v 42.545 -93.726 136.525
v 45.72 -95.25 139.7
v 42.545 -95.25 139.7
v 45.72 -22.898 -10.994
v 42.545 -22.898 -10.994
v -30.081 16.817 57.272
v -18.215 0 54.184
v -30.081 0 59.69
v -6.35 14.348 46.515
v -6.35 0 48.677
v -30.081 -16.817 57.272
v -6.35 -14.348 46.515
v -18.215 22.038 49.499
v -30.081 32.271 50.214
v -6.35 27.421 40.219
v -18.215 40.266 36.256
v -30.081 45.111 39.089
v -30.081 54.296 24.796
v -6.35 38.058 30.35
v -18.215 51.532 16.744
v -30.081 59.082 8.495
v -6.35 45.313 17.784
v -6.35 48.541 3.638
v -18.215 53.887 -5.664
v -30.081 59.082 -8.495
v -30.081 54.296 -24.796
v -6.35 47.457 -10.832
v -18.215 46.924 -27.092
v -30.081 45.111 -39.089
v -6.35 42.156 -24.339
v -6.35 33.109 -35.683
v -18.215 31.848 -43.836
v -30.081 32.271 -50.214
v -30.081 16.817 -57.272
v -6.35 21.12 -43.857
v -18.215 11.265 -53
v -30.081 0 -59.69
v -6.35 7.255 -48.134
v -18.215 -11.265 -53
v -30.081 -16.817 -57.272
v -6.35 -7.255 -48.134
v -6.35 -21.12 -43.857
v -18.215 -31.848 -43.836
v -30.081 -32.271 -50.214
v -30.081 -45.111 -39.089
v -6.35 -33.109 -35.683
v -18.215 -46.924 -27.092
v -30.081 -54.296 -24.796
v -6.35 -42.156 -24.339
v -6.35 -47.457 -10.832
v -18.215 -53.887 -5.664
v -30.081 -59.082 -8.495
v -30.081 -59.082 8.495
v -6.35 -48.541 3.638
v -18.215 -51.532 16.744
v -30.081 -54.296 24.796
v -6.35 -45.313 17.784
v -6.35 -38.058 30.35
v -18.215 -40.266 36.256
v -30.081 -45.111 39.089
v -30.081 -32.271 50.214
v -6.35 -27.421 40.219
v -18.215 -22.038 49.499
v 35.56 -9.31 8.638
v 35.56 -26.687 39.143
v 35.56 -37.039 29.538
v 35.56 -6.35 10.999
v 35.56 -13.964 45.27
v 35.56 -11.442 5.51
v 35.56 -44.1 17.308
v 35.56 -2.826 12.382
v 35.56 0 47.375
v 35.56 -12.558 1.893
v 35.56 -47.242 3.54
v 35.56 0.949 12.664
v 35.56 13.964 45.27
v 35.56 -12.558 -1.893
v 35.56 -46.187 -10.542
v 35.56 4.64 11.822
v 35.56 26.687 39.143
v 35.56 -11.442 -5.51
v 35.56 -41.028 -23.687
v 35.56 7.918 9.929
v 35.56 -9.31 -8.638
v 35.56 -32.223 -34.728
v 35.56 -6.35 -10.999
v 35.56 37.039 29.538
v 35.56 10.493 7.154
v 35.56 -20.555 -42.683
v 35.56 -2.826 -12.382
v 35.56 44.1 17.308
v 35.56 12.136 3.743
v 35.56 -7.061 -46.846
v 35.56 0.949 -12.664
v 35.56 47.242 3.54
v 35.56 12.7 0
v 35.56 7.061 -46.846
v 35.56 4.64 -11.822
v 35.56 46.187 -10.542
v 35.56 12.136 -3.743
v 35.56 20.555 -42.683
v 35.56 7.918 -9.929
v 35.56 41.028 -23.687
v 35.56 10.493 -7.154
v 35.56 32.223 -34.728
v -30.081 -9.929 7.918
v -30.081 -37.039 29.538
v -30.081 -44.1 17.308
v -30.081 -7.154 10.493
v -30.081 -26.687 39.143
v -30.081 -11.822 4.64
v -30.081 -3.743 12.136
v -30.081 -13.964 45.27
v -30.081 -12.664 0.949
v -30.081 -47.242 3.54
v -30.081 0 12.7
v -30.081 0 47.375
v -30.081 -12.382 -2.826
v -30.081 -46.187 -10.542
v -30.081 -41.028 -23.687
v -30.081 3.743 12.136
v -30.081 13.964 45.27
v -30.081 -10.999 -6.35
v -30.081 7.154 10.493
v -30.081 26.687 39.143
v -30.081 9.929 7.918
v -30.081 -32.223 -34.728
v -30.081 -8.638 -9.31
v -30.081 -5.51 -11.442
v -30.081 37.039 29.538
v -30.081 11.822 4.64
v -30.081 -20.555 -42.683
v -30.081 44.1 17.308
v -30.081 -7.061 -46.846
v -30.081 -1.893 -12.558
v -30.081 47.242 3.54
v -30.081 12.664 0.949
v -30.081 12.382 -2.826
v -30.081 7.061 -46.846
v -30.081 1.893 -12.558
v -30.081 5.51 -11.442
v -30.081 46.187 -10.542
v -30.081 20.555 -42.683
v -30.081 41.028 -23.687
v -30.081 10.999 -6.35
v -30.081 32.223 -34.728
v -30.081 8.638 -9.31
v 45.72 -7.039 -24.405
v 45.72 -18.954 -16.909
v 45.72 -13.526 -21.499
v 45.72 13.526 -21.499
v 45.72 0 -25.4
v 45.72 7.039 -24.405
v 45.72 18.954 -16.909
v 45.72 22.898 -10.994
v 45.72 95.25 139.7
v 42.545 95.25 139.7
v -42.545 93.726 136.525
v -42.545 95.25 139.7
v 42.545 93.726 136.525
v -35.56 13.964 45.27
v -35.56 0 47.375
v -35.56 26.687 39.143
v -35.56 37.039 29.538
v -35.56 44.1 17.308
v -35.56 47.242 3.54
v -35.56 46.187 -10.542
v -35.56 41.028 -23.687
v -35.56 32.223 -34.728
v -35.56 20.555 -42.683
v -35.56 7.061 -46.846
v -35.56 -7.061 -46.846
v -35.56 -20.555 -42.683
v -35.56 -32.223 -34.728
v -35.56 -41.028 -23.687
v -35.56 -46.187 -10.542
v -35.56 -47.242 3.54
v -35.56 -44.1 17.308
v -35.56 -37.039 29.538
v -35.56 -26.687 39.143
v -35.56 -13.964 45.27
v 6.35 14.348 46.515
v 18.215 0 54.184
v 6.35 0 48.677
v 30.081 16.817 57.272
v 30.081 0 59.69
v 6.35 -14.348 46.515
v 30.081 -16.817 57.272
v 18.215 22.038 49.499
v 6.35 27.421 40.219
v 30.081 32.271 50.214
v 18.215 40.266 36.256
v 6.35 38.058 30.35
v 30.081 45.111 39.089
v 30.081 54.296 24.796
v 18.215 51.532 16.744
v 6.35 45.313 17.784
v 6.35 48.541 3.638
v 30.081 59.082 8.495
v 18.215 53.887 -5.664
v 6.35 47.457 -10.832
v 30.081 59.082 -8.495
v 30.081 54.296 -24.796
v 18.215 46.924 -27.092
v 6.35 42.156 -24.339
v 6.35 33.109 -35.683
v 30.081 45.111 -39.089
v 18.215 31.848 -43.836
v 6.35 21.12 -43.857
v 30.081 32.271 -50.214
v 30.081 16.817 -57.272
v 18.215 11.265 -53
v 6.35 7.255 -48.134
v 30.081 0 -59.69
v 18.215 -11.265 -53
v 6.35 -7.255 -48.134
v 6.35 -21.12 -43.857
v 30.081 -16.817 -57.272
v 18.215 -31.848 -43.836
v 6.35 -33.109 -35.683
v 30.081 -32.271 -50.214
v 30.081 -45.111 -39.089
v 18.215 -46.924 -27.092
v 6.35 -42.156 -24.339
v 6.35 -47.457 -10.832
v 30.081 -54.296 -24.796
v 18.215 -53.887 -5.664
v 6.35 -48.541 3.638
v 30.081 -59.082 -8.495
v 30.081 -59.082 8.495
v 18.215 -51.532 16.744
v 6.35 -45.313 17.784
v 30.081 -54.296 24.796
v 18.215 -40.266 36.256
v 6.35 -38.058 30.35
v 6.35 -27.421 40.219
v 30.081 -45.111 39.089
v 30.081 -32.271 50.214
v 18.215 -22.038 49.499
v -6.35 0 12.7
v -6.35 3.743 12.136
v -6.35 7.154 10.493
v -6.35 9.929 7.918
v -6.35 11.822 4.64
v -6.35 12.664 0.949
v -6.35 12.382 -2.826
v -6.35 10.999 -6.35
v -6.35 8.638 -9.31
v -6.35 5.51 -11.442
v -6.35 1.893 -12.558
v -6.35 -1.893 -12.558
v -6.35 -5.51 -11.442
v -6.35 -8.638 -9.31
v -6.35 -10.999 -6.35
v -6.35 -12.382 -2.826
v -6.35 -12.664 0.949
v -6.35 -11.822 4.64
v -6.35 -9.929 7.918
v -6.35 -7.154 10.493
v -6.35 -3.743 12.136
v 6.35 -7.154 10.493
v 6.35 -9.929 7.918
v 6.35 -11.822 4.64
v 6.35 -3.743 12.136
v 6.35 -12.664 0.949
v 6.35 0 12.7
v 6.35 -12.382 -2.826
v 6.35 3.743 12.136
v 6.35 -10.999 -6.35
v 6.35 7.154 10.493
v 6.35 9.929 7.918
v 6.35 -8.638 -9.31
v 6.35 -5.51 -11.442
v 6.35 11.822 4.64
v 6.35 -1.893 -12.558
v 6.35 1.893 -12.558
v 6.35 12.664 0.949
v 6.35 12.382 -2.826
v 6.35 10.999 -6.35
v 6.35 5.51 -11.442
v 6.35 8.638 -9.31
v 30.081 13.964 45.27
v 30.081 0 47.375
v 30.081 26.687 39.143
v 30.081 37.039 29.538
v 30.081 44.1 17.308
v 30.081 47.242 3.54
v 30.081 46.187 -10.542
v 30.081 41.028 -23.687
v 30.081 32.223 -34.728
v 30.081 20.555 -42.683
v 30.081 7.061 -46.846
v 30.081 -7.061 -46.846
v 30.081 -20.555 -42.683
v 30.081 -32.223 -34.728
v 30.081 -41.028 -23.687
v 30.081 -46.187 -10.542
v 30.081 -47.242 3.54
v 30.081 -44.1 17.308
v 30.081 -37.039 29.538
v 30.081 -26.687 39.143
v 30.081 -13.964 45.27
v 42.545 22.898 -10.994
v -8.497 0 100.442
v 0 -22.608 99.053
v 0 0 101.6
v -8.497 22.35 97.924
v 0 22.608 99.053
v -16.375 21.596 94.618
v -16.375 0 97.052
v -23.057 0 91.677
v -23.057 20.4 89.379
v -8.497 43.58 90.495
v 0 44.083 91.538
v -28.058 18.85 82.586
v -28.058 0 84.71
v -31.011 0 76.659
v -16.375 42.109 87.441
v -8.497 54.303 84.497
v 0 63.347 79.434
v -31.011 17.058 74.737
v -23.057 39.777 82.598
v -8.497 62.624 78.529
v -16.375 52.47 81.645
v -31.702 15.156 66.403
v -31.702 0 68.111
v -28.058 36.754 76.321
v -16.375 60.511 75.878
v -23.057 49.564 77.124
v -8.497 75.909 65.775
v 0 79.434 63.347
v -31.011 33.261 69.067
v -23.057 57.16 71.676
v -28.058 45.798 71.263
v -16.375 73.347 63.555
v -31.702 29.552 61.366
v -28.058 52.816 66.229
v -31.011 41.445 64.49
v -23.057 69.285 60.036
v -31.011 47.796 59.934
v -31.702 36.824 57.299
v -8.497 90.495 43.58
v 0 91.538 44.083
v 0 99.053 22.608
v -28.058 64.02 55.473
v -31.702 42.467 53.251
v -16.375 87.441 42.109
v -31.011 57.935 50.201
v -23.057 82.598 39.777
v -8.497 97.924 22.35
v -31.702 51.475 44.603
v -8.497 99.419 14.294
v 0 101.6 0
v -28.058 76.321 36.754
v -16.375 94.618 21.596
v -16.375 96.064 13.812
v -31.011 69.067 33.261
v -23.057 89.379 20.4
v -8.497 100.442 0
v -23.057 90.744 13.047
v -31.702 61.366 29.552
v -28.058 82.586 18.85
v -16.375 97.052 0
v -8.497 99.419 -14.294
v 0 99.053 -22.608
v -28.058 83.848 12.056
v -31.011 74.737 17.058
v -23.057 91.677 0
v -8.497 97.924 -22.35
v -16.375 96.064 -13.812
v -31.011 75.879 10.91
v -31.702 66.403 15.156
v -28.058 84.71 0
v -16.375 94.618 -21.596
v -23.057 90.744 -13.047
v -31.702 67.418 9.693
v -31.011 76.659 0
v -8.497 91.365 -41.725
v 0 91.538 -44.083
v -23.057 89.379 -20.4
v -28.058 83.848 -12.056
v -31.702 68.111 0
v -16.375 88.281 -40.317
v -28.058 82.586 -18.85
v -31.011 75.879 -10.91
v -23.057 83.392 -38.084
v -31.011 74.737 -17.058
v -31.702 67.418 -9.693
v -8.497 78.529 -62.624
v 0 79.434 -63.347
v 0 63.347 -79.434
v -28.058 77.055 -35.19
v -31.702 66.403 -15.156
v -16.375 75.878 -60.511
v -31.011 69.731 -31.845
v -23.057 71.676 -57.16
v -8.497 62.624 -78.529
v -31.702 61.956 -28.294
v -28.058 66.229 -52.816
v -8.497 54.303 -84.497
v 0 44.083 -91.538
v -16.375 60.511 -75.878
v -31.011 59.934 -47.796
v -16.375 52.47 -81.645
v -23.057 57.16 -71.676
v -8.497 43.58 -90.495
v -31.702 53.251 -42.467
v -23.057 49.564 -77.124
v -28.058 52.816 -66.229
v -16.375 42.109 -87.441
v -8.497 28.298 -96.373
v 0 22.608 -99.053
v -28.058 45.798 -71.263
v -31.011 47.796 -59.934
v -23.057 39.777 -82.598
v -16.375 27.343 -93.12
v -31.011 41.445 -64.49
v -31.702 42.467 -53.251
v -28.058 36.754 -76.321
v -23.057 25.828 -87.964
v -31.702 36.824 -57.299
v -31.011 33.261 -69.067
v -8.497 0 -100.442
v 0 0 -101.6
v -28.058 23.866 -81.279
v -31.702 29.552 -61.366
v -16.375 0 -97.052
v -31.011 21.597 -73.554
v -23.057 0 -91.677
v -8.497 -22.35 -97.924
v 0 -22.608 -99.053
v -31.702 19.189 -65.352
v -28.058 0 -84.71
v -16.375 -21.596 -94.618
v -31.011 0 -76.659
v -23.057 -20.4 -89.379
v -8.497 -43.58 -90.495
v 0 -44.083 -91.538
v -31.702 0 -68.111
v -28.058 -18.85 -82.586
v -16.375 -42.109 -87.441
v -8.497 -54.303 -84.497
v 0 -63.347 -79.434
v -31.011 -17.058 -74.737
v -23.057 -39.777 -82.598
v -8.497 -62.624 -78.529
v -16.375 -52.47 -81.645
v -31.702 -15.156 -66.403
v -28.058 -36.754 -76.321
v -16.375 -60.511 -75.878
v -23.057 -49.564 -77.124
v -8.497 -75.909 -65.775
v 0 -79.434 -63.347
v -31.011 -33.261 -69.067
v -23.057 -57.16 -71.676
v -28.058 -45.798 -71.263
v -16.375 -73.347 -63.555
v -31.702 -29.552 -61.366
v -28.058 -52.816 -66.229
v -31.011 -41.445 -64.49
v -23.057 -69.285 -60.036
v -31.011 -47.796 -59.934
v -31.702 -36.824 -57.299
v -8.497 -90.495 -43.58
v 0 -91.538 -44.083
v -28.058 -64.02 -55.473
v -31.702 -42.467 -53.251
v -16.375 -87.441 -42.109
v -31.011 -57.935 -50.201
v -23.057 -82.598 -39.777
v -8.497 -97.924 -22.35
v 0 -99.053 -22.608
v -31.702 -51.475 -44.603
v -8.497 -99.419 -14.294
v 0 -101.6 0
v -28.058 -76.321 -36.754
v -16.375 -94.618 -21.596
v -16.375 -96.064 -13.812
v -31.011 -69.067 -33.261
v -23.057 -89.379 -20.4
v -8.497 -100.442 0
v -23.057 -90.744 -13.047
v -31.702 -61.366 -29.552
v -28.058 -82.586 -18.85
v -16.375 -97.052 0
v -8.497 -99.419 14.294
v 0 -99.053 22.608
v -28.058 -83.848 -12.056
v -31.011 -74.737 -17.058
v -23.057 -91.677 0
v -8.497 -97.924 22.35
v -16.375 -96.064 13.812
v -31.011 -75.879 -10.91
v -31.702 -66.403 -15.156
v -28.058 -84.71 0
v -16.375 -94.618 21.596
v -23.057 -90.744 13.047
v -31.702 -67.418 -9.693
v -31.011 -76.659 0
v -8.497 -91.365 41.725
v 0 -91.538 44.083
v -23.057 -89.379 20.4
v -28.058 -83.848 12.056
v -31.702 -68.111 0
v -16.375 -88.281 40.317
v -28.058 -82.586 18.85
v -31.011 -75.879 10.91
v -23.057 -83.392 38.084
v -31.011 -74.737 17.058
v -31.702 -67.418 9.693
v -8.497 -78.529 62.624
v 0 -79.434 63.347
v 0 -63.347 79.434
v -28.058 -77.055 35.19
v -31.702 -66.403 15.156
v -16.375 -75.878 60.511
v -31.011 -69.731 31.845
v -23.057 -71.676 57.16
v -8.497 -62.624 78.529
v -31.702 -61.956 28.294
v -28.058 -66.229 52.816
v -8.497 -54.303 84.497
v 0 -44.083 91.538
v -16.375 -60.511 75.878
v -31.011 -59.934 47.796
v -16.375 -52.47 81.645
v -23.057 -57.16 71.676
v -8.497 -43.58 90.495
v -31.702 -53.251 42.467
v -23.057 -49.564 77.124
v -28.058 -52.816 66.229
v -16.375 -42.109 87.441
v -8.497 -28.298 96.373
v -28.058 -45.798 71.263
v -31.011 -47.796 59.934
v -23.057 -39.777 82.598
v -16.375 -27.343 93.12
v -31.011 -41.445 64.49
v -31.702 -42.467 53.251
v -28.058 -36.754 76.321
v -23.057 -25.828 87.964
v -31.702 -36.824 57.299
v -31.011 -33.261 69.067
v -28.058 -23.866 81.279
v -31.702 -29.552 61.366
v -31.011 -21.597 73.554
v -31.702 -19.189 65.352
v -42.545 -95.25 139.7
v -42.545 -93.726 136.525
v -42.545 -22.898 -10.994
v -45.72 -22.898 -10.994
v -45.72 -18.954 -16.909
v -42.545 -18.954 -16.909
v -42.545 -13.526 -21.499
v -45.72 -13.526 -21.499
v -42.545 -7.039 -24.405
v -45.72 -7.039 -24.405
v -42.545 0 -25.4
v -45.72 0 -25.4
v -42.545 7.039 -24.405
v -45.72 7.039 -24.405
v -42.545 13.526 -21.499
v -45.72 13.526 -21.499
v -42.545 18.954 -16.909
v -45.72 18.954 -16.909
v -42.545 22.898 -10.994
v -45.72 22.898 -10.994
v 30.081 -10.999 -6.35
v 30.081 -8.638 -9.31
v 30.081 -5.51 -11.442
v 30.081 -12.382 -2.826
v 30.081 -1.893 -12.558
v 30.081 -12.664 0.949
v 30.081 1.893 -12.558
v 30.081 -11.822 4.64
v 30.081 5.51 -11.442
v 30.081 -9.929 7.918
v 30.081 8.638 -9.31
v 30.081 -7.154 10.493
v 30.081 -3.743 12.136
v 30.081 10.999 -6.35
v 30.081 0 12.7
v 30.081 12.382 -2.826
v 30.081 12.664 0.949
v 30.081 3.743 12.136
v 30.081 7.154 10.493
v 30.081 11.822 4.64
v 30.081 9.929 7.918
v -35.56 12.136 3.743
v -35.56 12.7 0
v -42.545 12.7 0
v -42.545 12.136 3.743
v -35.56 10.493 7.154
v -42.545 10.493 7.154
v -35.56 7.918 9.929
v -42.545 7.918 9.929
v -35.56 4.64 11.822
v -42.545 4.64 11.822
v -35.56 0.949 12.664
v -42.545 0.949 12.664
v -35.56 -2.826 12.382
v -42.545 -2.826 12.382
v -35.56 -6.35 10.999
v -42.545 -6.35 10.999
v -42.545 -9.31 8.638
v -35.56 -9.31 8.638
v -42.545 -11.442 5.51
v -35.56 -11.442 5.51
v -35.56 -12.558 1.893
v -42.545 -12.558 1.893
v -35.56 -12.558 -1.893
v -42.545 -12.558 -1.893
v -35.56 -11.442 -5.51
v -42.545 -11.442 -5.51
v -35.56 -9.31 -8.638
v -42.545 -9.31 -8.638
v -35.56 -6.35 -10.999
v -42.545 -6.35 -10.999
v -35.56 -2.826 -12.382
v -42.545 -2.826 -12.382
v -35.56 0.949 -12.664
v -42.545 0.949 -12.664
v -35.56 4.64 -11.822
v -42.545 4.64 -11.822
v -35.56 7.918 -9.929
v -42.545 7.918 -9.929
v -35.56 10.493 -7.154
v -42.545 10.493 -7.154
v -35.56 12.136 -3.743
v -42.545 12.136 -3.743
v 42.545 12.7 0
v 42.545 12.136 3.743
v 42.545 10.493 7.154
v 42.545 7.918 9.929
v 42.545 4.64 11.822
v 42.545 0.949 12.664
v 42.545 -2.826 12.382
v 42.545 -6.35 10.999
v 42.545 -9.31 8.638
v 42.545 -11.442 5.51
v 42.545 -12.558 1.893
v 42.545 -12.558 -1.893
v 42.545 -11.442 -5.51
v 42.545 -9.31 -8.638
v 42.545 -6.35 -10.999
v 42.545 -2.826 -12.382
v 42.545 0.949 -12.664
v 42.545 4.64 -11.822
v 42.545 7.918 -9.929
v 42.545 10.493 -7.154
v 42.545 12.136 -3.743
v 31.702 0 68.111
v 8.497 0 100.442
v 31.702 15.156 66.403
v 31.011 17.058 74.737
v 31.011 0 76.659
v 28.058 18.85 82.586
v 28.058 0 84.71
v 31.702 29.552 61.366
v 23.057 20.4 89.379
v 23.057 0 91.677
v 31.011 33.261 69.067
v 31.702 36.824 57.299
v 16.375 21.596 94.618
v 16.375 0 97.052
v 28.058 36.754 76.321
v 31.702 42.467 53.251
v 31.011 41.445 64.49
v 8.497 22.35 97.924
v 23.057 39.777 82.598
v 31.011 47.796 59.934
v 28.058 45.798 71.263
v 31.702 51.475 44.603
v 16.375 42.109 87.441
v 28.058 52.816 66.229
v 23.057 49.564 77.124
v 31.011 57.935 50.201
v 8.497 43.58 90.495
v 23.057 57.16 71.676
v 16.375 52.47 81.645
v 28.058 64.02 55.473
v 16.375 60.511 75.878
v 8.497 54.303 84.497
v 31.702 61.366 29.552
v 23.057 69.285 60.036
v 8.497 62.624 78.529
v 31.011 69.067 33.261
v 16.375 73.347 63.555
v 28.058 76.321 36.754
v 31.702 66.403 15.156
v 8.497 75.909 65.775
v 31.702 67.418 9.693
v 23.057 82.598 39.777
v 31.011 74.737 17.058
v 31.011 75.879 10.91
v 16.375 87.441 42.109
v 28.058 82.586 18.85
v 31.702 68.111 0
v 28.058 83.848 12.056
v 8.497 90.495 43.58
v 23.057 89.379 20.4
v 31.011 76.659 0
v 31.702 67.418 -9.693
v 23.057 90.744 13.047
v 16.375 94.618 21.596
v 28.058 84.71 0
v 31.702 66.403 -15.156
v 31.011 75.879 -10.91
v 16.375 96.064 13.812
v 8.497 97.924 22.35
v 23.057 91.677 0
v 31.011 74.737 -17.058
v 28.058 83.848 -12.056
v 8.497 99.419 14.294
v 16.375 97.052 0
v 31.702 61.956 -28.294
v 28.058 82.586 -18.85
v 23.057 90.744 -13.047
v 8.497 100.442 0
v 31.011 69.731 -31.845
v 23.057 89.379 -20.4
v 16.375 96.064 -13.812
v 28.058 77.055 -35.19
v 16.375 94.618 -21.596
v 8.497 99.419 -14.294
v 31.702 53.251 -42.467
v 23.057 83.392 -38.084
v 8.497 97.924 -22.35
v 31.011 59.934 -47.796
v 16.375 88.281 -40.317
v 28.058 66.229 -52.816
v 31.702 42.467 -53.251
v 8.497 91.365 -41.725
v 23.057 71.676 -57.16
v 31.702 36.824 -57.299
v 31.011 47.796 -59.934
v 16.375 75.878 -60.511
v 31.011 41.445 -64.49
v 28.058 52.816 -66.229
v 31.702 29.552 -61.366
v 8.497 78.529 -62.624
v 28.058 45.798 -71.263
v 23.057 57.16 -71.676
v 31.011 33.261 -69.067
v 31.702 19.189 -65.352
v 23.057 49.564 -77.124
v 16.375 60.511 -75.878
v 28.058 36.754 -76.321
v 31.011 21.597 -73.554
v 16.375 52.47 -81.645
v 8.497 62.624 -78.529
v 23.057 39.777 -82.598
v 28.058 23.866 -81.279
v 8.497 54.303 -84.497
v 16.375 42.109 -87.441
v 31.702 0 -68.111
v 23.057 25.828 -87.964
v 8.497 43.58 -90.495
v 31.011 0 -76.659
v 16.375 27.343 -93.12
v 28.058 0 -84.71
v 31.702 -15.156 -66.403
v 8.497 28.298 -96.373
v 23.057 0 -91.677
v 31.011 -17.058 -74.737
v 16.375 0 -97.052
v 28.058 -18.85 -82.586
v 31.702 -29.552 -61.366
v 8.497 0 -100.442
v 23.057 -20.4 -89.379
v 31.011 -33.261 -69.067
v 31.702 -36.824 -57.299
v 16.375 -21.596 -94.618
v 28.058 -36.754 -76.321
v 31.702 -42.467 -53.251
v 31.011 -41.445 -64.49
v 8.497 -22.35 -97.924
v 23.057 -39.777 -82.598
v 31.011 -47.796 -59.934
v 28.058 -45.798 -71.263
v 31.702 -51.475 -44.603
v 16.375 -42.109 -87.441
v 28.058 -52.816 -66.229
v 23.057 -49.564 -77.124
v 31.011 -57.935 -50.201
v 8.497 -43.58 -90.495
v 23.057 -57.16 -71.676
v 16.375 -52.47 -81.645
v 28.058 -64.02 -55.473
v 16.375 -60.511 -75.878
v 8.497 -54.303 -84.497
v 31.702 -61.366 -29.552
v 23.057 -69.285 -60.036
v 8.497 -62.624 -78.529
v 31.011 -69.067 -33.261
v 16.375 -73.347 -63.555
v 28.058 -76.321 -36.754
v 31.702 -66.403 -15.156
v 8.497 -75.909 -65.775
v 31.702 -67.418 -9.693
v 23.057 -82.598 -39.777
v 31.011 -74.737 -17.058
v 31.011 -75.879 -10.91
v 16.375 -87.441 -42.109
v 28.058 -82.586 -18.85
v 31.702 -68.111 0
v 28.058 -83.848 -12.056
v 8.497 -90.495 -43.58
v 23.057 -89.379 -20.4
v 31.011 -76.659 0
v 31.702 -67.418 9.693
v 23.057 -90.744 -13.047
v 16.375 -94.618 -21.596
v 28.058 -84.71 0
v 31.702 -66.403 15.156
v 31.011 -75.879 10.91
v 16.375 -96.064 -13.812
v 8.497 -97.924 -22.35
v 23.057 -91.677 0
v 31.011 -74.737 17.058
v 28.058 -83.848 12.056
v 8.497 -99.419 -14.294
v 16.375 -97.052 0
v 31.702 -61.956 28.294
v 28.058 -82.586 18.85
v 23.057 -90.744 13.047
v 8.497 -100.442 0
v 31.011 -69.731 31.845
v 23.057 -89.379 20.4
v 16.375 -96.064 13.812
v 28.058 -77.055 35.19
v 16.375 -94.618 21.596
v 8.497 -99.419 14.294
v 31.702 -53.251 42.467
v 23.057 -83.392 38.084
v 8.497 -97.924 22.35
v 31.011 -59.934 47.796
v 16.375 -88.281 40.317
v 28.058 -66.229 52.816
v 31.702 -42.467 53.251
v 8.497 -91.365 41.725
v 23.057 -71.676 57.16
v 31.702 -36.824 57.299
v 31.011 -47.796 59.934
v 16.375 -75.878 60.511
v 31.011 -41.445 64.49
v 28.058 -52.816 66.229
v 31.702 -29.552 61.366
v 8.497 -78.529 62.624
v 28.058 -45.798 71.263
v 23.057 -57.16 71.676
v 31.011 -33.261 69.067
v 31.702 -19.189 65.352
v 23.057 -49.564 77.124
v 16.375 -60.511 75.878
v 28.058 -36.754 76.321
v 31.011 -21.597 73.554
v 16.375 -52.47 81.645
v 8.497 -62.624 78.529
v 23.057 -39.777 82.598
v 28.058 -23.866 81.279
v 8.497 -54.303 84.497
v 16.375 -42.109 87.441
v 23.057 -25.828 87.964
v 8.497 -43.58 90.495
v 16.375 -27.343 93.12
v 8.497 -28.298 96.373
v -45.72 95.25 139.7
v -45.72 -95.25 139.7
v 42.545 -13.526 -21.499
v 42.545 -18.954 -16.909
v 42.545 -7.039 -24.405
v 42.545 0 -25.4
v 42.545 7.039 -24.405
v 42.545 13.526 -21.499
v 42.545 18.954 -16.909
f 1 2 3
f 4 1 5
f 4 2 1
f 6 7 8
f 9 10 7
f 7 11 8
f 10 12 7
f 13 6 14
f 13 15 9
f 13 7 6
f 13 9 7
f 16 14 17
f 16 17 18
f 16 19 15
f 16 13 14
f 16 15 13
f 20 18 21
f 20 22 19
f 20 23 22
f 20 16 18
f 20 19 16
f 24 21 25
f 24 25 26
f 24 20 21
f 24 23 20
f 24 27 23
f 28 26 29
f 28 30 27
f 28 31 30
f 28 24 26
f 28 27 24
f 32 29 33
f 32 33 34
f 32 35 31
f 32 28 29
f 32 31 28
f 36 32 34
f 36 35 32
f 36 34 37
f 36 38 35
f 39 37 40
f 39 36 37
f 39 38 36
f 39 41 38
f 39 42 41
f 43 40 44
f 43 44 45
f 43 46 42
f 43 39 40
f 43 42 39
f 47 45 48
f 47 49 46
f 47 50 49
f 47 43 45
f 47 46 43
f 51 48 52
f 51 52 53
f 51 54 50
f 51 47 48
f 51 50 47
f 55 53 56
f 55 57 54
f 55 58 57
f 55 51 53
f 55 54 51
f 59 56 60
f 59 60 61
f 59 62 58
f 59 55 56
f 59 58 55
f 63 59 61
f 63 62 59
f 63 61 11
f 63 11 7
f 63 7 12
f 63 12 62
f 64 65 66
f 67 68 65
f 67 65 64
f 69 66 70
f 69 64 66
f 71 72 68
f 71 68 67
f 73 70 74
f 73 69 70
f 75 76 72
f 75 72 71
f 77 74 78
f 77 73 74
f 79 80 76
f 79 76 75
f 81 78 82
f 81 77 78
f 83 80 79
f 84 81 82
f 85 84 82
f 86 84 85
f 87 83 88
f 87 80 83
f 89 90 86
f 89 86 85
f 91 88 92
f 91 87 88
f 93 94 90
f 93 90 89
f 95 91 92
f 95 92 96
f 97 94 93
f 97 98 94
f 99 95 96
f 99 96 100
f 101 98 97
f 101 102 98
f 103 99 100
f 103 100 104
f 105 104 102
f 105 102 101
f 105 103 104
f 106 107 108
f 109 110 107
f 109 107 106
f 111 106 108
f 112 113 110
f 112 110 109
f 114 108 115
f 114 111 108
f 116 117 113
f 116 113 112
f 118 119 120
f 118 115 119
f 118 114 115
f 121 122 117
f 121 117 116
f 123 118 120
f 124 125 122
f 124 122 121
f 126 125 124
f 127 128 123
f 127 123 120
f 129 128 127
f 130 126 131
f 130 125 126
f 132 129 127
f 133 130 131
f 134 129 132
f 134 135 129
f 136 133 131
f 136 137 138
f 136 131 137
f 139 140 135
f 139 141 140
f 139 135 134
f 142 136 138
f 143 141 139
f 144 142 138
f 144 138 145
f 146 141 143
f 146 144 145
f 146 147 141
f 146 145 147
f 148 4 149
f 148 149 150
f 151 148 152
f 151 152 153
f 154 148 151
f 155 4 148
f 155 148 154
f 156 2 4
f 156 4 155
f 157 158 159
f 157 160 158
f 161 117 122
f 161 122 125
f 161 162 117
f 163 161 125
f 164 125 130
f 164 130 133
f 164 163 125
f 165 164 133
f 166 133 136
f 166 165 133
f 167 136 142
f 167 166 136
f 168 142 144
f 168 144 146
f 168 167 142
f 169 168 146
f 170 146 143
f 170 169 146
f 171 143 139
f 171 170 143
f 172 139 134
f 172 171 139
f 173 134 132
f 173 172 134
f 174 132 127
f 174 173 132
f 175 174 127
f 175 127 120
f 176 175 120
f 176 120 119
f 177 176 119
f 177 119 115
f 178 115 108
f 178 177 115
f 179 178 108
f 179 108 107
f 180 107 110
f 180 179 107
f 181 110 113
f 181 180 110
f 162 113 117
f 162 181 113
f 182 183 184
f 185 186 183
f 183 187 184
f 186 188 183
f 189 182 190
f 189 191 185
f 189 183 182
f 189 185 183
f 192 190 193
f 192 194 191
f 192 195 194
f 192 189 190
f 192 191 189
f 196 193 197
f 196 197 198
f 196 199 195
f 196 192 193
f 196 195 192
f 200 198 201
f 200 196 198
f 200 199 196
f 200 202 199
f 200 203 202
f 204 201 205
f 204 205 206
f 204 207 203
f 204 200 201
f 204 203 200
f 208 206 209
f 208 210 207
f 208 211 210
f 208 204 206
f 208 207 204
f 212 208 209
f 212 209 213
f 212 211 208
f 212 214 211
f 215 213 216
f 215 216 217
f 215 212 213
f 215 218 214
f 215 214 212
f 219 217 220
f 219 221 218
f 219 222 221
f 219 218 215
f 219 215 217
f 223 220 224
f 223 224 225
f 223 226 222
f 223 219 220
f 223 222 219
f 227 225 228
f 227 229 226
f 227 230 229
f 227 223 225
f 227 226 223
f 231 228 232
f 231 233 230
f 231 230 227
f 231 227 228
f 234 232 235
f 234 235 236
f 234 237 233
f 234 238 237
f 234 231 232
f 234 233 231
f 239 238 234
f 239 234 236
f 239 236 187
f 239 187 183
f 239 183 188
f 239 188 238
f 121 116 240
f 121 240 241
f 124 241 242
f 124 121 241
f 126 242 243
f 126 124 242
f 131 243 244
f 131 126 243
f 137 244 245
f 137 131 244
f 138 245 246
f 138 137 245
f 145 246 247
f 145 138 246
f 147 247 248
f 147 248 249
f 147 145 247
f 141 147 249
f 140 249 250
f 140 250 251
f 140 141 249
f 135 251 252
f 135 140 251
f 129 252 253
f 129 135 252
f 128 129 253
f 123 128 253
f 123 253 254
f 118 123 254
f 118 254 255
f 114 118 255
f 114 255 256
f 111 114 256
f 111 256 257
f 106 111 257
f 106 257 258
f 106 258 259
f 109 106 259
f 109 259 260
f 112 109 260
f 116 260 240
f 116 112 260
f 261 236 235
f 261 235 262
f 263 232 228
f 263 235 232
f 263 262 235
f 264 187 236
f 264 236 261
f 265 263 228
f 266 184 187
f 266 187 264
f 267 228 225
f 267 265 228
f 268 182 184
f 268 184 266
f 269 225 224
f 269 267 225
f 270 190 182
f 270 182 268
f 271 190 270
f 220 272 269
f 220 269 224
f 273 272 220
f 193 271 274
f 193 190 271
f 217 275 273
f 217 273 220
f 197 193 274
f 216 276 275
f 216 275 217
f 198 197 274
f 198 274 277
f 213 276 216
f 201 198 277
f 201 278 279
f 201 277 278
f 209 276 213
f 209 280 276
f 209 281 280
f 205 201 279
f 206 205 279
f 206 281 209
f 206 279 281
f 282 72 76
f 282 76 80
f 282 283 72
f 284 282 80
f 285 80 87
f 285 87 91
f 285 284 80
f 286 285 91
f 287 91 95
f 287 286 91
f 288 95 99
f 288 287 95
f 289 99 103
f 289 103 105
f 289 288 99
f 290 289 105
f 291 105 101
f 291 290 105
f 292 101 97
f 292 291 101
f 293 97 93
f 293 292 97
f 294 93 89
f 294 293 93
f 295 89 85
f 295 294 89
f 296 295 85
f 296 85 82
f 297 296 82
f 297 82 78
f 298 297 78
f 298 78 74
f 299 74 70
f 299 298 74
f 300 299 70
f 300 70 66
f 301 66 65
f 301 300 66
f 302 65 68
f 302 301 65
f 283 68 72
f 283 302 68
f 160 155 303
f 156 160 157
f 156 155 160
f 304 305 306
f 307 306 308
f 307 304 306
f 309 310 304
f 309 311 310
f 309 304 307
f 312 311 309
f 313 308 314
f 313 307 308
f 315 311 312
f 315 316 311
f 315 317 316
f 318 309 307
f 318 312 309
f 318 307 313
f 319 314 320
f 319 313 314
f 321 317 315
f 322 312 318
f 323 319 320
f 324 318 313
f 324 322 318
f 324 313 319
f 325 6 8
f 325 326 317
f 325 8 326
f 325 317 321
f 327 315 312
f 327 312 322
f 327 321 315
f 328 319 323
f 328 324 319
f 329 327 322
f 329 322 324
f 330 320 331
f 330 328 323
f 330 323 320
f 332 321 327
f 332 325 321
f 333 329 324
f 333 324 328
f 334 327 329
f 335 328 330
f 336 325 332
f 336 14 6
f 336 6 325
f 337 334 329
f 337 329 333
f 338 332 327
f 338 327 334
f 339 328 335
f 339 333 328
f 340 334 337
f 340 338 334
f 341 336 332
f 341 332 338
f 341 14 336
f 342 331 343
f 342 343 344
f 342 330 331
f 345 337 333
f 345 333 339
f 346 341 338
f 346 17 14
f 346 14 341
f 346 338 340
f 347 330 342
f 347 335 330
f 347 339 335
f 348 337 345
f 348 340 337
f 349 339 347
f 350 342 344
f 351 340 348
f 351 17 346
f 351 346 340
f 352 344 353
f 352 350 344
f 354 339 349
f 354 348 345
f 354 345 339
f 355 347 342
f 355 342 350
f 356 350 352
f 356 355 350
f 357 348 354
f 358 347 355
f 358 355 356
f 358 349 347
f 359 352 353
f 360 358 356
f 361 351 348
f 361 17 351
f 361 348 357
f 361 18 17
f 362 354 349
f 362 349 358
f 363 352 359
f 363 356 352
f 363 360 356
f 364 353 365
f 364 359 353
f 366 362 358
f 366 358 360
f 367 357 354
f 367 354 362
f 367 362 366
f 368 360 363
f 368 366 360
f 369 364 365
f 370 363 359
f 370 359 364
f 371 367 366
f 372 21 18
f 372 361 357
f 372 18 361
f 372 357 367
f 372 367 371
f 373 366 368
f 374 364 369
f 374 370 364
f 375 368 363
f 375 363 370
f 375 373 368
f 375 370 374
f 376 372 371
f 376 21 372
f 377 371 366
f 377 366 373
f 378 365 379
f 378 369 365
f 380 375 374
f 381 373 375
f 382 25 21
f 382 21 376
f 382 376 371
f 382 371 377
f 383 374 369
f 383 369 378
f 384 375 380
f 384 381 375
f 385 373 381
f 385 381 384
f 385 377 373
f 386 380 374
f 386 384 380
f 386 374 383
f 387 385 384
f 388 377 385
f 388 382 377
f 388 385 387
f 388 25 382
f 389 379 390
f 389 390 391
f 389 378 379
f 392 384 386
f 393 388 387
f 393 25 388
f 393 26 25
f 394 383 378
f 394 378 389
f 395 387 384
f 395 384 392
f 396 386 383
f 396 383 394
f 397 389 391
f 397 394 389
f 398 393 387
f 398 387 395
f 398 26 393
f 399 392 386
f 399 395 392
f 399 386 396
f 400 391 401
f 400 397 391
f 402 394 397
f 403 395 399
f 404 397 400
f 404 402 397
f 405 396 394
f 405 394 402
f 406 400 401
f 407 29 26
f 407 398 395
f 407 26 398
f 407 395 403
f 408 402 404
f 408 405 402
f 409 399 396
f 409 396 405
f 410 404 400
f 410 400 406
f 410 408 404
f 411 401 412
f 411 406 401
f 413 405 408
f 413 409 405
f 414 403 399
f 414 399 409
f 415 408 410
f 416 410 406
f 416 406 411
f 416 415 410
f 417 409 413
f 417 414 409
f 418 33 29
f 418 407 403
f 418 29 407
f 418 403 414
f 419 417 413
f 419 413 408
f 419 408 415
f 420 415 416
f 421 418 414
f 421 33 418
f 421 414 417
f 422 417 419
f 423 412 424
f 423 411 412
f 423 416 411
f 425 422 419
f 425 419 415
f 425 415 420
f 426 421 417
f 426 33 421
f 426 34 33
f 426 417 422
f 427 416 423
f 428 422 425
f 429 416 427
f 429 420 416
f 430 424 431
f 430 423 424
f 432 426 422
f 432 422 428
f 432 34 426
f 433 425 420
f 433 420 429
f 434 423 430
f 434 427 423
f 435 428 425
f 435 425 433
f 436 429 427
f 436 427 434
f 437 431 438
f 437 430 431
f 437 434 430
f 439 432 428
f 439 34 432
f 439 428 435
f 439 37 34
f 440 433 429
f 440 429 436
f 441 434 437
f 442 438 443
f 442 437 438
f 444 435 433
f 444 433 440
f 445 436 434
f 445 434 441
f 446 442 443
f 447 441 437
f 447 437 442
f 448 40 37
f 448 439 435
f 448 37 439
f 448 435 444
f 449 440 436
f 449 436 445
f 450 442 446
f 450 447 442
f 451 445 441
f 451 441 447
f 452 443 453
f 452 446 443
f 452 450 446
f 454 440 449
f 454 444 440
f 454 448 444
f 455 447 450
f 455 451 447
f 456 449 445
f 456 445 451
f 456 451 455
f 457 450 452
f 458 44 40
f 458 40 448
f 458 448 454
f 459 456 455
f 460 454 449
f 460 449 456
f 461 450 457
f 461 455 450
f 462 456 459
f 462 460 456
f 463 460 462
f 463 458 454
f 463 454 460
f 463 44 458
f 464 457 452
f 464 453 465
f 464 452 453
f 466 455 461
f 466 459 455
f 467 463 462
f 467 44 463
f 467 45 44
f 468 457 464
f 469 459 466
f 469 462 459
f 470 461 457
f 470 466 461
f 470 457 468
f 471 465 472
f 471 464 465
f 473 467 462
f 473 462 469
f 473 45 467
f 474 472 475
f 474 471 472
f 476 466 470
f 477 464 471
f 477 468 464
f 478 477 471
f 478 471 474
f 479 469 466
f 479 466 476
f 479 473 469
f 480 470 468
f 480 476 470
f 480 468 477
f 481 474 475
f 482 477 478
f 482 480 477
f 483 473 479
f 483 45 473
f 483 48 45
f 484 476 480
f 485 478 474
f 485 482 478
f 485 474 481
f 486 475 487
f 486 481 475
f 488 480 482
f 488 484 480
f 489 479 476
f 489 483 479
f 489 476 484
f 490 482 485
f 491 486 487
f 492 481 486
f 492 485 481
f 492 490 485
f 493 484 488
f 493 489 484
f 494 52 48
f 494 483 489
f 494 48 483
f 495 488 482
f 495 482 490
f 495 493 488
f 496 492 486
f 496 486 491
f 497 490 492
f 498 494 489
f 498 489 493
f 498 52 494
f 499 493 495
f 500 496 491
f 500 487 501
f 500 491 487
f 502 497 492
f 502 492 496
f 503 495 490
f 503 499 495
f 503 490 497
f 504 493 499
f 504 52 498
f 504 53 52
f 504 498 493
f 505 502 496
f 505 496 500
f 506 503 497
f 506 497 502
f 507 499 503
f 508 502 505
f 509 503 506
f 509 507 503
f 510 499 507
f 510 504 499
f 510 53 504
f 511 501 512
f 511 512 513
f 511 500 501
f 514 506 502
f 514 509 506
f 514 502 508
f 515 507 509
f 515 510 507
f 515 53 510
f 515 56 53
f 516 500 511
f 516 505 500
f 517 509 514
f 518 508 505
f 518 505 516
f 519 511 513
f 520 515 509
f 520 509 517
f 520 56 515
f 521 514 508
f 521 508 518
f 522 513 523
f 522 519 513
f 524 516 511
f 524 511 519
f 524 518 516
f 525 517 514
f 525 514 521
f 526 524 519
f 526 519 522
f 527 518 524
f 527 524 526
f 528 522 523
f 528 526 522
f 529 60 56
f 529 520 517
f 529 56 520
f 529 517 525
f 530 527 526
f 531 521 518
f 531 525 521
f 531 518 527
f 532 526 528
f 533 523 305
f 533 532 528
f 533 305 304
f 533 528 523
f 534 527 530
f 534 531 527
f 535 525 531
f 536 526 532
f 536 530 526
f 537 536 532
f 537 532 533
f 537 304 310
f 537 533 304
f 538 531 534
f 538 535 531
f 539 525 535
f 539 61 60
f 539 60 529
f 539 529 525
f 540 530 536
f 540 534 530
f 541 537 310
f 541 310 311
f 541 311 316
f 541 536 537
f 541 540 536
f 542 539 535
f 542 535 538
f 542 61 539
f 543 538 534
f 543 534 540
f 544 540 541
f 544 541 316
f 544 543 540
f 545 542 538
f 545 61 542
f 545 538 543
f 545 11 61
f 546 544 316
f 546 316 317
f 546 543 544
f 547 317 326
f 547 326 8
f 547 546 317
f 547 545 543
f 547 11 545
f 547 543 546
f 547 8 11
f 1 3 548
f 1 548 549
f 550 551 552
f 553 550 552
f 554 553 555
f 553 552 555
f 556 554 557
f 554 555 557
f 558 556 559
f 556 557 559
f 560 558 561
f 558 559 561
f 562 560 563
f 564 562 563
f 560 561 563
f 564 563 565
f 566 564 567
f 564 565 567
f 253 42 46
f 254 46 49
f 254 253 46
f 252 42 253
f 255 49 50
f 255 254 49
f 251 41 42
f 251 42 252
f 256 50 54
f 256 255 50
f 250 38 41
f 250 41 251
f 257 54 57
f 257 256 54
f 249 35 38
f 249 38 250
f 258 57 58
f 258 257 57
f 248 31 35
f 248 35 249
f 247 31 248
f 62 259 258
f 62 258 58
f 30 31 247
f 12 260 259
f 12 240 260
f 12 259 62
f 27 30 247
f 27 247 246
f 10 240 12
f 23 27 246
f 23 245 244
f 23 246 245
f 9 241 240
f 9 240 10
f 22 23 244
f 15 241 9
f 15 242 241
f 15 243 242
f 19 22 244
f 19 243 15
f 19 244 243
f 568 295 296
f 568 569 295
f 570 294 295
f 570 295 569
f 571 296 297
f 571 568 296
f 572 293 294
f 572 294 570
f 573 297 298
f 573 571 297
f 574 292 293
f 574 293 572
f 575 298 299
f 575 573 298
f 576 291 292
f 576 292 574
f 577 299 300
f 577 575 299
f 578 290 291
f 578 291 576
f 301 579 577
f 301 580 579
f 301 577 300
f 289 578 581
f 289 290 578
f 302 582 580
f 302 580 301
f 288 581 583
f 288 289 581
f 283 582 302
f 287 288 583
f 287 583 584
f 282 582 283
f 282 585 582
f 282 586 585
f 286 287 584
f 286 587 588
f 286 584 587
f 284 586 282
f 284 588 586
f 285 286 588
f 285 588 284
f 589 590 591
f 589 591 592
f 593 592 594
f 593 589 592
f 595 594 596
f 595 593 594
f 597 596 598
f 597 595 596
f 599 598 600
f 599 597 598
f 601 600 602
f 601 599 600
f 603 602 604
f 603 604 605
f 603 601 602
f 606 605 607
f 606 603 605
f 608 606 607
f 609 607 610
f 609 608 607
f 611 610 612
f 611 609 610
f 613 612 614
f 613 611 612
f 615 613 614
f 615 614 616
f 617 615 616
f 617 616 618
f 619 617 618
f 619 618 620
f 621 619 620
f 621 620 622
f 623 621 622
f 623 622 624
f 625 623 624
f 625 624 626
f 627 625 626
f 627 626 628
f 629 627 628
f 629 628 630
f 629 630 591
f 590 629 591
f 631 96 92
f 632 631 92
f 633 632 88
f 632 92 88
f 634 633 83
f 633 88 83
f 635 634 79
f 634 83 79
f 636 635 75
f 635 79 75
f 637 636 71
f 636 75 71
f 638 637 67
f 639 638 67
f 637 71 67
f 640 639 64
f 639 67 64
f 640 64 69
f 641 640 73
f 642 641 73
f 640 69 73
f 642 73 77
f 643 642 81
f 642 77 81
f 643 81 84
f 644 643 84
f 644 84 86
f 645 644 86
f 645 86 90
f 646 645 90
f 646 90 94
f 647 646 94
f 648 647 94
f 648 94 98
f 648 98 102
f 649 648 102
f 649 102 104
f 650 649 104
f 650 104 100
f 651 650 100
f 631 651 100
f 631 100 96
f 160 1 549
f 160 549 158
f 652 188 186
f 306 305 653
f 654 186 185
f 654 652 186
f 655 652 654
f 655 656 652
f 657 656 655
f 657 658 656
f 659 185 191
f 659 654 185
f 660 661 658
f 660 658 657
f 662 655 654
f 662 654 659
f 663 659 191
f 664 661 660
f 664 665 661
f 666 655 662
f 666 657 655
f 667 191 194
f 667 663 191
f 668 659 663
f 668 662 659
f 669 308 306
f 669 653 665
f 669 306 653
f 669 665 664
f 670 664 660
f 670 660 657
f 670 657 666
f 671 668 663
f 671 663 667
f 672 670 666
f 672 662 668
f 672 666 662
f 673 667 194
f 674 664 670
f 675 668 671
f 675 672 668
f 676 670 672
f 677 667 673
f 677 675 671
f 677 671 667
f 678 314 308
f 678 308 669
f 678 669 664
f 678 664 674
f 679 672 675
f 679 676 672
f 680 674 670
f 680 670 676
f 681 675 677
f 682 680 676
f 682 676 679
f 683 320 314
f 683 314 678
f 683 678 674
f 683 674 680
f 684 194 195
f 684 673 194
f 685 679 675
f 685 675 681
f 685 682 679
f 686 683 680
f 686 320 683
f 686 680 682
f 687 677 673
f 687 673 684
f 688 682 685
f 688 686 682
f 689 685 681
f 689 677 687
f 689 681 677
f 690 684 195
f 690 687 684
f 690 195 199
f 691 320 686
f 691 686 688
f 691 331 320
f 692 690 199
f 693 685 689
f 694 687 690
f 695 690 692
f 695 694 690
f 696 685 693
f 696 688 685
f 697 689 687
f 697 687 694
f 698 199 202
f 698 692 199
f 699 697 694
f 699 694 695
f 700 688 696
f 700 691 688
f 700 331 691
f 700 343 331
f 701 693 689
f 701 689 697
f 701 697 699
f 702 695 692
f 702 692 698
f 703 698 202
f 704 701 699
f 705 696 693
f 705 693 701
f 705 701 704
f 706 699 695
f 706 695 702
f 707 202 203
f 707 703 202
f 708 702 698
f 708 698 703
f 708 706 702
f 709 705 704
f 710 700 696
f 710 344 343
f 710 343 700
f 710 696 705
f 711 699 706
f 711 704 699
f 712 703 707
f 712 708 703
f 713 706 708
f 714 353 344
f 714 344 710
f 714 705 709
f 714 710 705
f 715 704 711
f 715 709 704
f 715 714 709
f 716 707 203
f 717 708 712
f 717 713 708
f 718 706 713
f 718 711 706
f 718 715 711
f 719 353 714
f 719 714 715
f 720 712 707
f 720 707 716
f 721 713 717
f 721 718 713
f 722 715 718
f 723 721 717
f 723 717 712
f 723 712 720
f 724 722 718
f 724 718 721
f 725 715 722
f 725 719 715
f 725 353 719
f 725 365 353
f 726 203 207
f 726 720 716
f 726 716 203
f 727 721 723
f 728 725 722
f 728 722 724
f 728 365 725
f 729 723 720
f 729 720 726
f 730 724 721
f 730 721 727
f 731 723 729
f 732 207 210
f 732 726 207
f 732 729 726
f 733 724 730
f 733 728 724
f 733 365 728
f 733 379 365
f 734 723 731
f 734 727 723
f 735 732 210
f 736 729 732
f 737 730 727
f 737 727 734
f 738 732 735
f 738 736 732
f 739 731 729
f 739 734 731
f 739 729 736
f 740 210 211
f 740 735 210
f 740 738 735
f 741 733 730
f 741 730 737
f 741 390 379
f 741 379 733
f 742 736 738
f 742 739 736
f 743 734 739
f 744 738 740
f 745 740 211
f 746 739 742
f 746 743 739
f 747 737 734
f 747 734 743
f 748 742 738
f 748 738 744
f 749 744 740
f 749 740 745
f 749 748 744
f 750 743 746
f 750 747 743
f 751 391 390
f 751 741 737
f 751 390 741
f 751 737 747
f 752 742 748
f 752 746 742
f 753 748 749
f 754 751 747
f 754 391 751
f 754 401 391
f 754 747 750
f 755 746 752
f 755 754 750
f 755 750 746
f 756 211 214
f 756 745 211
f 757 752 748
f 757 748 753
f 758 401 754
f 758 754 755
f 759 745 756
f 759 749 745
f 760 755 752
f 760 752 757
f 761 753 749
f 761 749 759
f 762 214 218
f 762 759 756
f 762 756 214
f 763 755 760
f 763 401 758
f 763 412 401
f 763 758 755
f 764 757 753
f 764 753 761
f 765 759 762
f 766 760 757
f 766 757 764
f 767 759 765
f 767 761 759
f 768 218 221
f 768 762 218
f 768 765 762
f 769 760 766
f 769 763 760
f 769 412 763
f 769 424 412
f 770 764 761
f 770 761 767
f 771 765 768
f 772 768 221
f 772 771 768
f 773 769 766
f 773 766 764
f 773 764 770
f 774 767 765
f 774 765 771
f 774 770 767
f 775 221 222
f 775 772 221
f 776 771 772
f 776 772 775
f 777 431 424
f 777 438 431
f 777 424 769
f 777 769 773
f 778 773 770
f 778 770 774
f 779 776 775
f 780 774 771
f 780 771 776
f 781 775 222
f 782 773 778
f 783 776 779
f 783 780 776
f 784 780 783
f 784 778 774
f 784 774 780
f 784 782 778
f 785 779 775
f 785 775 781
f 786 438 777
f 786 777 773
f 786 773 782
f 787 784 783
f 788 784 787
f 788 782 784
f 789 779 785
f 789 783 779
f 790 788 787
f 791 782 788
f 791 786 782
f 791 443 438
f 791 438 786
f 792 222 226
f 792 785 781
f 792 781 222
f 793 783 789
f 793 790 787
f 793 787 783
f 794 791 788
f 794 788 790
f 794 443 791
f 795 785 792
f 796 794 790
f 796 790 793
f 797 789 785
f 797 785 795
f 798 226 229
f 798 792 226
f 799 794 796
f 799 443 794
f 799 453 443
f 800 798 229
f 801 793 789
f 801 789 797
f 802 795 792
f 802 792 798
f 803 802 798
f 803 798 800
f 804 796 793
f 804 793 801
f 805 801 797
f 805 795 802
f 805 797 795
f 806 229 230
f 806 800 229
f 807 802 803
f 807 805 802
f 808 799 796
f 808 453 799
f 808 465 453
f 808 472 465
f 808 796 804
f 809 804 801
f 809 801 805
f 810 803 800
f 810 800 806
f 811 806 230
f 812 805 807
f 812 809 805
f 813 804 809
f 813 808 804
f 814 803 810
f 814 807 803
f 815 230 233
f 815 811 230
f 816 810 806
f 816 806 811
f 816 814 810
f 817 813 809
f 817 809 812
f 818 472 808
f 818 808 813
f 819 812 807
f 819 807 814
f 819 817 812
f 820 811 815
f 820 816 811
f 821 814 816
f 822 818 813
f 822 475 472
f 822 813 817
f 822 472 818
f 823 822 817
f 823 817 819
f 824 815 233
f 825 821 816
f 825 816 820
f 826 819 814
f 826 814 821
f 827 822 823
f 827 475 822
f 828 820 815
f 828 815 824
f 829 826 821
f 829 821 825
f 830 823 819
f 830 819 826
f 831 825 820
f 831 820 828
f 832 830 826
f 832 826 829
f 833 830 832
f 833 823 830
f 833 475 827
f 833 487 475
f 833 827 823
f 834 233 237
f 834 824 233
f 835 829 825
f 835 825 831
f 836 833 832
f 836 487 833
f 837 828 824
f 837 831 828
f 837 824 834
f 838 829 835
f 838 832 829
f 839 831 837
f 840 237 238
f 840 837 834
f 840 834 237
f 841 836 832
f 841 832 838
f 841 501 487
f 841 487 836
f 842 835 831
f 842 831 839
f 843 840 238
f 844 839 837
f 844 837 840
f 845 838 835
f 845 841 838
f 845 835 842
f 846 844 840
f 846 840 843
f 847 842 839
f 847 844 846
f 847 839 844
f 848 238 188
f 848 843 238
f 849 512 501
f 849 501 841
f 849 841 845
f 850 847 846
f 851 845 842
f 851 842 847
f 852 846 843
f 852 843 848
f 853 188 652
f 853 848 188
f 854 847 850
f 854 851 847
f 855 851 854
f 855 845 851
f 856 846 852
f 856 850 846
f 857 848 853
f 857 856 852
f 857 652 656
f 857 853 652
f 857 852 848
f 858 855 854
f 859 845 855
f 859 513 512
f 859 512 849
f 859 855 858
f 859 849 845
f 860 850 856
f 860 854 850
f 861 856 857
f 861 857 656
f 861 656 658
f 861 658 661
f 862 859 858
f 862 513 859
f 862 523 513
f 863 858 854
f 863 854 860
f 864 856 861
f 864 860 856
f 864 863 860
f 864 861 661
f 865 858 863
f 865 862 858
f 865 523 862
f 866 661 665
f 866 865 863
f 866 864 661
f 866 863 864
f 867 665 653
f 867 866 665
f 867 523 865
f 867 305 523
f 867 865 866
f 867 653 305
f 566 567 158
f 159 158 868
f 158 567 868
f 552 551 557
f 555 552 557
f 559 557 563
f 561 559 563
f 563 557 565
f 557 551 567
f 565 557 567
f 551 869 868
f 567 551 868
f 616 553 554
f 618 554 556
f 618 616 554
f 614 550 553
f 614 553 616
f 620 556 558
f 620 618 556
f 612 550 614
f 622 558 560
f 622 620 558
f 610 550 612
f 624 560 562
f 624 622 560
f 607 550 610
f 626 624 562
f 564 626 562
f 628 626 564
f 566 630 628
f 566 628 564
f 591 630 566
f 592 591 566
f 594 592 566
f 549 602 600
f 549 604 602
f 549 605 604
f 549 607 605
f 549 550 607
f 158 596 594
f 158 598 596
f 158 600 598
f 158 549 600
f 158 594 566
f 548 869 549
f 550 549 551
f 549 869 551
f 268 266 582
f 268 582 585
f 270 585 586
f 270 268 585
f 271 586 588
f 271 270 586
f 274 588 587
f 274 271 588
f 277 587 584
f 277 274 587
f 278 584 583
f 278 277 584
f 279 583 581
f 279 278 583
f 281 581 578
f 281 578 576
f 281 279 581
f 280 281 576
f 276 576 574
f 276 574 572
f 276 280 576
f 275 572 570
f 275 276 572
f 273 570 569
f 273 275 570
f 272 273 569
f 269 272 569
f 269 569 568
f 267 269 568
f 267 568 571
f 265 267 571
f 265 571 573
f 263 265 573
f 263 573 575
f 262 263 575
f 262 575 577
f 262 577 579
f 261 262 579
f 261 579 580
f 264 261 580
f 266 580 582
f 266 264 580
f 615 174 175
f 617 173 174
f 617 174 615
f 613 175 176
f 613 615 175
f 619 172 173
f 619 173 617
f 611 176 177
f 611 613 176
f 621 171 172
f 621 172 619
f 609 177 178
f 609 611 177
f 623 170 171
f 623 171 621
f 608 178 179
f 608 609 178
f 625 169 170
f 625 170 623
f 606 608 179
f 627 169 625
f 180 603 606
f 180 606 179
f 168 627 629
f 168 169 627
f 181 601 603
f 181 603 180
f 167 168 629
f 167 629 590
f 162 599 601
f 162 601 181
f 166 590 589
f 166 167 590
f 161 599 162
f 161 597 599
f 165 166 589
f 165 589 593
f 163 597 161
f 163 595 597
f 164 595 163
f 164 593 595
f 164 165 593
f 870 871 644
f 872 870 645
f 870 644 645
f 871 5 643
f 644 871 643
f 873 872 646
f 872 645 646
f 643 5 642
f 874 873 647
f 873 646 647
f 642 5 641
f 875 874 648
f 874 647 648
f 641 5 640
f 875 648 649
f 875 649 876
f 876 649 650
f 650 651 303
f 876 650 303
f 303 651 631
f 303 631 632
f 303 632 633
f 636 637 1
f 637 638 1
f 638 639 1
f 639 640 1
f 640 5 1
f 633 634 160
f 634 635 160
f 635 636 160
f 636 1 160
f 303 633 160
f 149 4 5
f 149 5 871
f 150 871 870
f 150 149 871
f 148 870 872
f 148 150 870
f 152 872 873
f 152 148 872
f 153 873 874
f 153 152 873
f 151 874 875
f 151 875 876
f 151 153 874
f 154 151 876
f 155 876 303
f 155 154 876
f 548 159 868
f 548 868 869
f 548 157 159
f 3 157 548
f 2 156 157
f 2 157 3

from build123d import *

# Parameters (mm, degrees)
F4_DEPTH      = 3.175
F7_DEPTH      = 42.545
F7_DEPTH_BACK = 42.545
F8_R          = 12.7
F9_DEPTH      = 42.545
F9_DEPTH_BACK = 42.545


with BuildPart() as f1:
    # F0 (on Front) → F1 (revolve)
    with BuildSketch(Plane.XZ):
        with BuildLine():
            ThreePointArc((0, 101.6), (-25.7938219347, 88.3632722661), (-30.0805069771, 59.69))
            Line((-30.0805069771, 59.69), (-6.35, 48.6774114908))
            Line((-6.35, 48.6774114908), (-6.35, 12.7))
            Line((-6.35, 12.7), (-30.0805069771, 12.7))
            Line((-30.0805069771, 12.7), (-30.0805069771, 47.3746955395))
            Line((-30.0805069771, 47.3746955395), (-35.56, 47.3746955395))
            Line((-35.56, 47.3746955395), (-35.56, 0))
            Line((-35.56, 0), (0, 0))
            Line((0, 0), (35.56, 0))
            Line((35.56, 0), (35.56, 47.3746955395))
            Line((35.56, 47.3746955395), (30.0805069771, 47.3746955395))
            Line((30.0805069771, 47.3746955395), (30.0805069771, 12.7))
            Line((30.0805069771, 12.7), (6.35, 12.7))
            Line((6.35, 12.7), (6.35, 48.6774114908))
            Line((6.35, 48.6774114908), (30.0805069771, 59.69))
            ThreePointArc((30.0805069771, 59.69), (25.7938219347, 88.3632722661), (0, 101.6))
        make_face()
    revolve(axis=Axis((17.78, 0, 0), (-1, 0, 0)))



with BuildPart() as f4:
    # F3 (on offset) → F4 (new body)
    with BuildSketch(Plane.YZ.offset(45.72)):
        with BuildLine():
            Line((22.8975321566, -10.9937719249), (95.25, 139.7))
            Line((95.25, 139.7), (-95.25, 139.7))
            Line((-95.25, 139.7), (-22.8975321566, -10.9937719249))
            ThreePointArc((-22.8975321566, -10.9937719249), (0, -25.4), (22.8975321566, -10.9937719249))
        make_face()
    extrude(amount=-F4_DEPTH)


with BuildPart() as f5_1:
    # F5: instance of F4
    add(f4.part.mirror(Plane.YZ))


with BuildPart() as f4_1:
    add(f4.part)

    add(f5_1.part)  # F7 merges F5_1
    # F6 (on Right) → F7 (join, two sides)
    with BuildSketch(Plane.YZ) as f7_sk:
        Polygon((95.25, 139.7), (-95.25, 139.7), (-93.7255900495, 136.525), (93.7255900495, 136.525), align=None)
    extrude(amount=F7_DEPTH)
    extrude(f7_sk.sketch, amount=-F7_DEPTH_BACK)


with BuildPart() as f1_1:
    add(f1.part)

    add(f4_1.part)  # F9 merges F4
    # F8 (on Right) → F9 (join, two sides)
    with BuildSketch(Plane.YZ) as f9_sk:
        Circle(F8_R)
    extrude(amount=F9_DEPTH)
    extrude(f9_sk.sketch, amount=-F9_DEPTH_BACK)


solid = f1_1.part
